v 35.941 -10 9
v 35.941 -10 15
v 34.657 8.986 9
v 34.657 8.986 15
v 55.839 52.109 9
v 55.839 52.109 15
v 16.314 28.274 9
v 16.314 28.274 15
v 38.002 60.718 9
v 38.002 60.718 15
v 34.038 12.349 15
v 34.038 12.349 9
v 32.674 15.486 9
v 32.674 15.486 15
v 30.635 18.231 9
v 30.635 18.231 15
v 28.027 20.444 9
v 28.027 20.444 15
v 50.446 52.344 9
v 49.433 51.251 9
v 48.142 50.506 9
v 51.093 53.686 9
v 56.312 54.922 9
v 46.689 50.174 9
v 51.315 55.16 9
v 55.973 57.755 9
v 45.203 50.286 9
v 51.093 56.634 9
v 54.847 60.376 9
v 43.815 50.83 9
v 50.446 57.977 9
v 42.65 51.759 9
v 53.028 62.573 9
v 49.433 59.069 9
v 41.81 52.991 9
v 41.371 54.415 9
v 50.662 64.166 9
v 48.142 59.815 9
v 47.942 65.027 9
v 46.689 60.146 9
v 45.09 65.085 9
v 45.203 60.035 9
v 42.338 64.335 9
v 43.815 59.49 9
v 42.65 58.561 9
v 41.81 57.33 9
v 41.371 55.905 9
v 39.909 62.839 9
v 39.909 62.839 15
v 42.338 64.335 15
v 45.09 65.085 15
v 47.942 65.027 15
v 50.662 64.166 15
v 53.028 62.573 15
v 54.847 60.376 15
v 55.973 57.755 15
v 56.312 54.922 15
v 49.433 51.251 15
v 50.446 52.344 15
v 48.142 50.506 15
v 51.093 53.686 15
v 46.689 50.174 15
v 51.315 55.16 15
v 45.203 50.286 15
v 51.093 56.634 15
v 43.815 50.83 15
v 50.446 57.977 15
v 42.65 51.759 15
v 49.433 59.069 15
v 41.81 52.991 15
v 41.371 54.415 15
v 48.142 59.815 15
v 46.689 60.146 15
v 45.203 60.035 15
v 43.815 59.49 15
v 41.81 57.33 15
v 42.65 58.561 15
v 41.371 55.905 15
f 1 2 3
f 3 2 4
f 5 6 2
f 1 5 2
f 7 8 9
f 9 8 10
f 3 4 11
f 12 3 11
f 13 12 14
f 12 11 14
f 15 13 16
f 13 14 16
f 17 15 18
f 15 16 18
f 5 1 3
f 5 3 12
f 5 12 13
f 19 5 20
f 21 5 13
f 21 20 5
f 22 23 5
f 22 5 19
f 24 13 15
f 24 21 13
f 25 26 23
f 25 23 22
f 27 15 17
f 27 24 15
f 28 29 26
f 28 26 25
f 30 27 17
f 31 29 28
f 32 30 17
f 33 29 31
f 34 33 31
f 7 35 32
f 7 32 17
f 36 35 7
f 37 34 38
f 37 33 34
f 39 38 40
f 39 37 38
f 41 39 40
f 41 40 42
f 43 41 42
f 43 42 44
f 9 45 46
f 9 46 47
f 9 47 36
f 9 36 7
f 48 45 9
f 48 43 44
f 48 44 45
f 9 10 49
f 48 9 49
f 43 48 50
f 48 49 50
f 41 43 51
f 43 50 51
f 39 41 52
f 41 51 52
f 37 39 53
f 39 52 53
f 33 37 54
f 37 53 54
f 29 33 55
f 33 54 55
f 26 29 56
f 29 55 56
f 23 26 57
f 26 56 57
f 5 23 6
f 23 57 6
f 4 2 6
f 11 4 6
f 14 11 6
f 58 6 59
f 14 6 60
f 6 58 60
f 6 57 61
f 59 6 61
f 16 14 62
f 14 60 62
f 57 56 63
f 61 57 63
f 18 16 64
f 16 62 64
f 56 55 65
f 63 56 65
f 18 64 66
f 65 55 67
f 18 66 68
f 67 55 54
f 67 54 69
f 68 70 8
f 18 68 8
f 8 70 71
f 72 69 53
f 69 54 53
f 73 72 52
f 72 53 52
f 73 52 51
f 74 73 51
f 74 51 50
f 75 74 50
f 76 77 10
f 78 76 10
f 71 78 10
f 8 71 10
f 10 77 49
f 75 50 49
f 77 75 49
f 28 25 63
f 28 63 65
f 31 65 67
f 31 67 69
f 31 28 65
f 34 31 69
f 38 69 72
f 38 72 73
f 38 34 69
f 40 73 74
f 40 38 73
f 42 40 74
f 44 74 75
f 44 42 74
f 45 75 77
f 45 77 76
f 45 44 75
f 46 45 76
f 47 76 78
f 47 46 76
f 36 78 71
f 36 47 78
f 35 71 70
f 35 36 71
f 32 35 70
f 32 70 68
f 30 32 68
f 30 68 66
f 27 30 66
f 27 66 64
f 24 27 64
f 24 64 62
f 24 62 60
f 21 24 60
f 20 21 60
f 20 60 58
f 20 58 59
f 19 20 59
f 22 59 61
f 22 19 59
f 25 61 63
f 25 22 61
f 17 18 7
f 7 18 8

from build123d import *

# Parameters (mm, degrees)
BASE_EXTRUDE_DEPTH = 6
HOLE1_START        = 9
HOLE1_OUTLINE_R    = 5
HOLE1_DEPTH        = 6


# Read off the part's stored shape, not the designer's step: Hole1
with BuildPart() as part:
    # Sketch1 → Base-Extrude (new body)
    with BuildSketch(Plane(origin=(0, 0, 15), x_dir=(-1, 0, 0), z_dir=(0, 0, -1))):
        with BuildLine():
            Line((-35.94095366, -10), (-34.656774357, 8.985563209))
            ThreePointArc((-34.656774357, 8.985563209), (-32.674273273, 15.485526346), (-28.02703118, 20.443648194))
            Line((-28.02703118, 20.443648194), (-16.313883273, 28.273529827))
            Line((-16.313883273, 28.273529827), (-38.001708808, 60.717533475))
            ThreePointArc((-38.001708808, 60.717533475), (-50.661713644, 64.166190146), (-55.838522693, 52.109258389))
            Line((-55.838522693, 52.109258389), (-35.94095366, -10))
        make_face()
    extrude(amount=BASE_EXTRUDE_DEPTH)

    # Hole1 outline → Hole1 (cut)
    with BuildSketch(Plane.XY.offset(HOLE1_START)):
        with Locations((46.315287905, 55.160159761)):
            Circle(HOLE1_OUTLINE_R)
    extrude(amount=HOLE1_DEPTH, mode=Mode.SUBTRACT)


solid = part.part
